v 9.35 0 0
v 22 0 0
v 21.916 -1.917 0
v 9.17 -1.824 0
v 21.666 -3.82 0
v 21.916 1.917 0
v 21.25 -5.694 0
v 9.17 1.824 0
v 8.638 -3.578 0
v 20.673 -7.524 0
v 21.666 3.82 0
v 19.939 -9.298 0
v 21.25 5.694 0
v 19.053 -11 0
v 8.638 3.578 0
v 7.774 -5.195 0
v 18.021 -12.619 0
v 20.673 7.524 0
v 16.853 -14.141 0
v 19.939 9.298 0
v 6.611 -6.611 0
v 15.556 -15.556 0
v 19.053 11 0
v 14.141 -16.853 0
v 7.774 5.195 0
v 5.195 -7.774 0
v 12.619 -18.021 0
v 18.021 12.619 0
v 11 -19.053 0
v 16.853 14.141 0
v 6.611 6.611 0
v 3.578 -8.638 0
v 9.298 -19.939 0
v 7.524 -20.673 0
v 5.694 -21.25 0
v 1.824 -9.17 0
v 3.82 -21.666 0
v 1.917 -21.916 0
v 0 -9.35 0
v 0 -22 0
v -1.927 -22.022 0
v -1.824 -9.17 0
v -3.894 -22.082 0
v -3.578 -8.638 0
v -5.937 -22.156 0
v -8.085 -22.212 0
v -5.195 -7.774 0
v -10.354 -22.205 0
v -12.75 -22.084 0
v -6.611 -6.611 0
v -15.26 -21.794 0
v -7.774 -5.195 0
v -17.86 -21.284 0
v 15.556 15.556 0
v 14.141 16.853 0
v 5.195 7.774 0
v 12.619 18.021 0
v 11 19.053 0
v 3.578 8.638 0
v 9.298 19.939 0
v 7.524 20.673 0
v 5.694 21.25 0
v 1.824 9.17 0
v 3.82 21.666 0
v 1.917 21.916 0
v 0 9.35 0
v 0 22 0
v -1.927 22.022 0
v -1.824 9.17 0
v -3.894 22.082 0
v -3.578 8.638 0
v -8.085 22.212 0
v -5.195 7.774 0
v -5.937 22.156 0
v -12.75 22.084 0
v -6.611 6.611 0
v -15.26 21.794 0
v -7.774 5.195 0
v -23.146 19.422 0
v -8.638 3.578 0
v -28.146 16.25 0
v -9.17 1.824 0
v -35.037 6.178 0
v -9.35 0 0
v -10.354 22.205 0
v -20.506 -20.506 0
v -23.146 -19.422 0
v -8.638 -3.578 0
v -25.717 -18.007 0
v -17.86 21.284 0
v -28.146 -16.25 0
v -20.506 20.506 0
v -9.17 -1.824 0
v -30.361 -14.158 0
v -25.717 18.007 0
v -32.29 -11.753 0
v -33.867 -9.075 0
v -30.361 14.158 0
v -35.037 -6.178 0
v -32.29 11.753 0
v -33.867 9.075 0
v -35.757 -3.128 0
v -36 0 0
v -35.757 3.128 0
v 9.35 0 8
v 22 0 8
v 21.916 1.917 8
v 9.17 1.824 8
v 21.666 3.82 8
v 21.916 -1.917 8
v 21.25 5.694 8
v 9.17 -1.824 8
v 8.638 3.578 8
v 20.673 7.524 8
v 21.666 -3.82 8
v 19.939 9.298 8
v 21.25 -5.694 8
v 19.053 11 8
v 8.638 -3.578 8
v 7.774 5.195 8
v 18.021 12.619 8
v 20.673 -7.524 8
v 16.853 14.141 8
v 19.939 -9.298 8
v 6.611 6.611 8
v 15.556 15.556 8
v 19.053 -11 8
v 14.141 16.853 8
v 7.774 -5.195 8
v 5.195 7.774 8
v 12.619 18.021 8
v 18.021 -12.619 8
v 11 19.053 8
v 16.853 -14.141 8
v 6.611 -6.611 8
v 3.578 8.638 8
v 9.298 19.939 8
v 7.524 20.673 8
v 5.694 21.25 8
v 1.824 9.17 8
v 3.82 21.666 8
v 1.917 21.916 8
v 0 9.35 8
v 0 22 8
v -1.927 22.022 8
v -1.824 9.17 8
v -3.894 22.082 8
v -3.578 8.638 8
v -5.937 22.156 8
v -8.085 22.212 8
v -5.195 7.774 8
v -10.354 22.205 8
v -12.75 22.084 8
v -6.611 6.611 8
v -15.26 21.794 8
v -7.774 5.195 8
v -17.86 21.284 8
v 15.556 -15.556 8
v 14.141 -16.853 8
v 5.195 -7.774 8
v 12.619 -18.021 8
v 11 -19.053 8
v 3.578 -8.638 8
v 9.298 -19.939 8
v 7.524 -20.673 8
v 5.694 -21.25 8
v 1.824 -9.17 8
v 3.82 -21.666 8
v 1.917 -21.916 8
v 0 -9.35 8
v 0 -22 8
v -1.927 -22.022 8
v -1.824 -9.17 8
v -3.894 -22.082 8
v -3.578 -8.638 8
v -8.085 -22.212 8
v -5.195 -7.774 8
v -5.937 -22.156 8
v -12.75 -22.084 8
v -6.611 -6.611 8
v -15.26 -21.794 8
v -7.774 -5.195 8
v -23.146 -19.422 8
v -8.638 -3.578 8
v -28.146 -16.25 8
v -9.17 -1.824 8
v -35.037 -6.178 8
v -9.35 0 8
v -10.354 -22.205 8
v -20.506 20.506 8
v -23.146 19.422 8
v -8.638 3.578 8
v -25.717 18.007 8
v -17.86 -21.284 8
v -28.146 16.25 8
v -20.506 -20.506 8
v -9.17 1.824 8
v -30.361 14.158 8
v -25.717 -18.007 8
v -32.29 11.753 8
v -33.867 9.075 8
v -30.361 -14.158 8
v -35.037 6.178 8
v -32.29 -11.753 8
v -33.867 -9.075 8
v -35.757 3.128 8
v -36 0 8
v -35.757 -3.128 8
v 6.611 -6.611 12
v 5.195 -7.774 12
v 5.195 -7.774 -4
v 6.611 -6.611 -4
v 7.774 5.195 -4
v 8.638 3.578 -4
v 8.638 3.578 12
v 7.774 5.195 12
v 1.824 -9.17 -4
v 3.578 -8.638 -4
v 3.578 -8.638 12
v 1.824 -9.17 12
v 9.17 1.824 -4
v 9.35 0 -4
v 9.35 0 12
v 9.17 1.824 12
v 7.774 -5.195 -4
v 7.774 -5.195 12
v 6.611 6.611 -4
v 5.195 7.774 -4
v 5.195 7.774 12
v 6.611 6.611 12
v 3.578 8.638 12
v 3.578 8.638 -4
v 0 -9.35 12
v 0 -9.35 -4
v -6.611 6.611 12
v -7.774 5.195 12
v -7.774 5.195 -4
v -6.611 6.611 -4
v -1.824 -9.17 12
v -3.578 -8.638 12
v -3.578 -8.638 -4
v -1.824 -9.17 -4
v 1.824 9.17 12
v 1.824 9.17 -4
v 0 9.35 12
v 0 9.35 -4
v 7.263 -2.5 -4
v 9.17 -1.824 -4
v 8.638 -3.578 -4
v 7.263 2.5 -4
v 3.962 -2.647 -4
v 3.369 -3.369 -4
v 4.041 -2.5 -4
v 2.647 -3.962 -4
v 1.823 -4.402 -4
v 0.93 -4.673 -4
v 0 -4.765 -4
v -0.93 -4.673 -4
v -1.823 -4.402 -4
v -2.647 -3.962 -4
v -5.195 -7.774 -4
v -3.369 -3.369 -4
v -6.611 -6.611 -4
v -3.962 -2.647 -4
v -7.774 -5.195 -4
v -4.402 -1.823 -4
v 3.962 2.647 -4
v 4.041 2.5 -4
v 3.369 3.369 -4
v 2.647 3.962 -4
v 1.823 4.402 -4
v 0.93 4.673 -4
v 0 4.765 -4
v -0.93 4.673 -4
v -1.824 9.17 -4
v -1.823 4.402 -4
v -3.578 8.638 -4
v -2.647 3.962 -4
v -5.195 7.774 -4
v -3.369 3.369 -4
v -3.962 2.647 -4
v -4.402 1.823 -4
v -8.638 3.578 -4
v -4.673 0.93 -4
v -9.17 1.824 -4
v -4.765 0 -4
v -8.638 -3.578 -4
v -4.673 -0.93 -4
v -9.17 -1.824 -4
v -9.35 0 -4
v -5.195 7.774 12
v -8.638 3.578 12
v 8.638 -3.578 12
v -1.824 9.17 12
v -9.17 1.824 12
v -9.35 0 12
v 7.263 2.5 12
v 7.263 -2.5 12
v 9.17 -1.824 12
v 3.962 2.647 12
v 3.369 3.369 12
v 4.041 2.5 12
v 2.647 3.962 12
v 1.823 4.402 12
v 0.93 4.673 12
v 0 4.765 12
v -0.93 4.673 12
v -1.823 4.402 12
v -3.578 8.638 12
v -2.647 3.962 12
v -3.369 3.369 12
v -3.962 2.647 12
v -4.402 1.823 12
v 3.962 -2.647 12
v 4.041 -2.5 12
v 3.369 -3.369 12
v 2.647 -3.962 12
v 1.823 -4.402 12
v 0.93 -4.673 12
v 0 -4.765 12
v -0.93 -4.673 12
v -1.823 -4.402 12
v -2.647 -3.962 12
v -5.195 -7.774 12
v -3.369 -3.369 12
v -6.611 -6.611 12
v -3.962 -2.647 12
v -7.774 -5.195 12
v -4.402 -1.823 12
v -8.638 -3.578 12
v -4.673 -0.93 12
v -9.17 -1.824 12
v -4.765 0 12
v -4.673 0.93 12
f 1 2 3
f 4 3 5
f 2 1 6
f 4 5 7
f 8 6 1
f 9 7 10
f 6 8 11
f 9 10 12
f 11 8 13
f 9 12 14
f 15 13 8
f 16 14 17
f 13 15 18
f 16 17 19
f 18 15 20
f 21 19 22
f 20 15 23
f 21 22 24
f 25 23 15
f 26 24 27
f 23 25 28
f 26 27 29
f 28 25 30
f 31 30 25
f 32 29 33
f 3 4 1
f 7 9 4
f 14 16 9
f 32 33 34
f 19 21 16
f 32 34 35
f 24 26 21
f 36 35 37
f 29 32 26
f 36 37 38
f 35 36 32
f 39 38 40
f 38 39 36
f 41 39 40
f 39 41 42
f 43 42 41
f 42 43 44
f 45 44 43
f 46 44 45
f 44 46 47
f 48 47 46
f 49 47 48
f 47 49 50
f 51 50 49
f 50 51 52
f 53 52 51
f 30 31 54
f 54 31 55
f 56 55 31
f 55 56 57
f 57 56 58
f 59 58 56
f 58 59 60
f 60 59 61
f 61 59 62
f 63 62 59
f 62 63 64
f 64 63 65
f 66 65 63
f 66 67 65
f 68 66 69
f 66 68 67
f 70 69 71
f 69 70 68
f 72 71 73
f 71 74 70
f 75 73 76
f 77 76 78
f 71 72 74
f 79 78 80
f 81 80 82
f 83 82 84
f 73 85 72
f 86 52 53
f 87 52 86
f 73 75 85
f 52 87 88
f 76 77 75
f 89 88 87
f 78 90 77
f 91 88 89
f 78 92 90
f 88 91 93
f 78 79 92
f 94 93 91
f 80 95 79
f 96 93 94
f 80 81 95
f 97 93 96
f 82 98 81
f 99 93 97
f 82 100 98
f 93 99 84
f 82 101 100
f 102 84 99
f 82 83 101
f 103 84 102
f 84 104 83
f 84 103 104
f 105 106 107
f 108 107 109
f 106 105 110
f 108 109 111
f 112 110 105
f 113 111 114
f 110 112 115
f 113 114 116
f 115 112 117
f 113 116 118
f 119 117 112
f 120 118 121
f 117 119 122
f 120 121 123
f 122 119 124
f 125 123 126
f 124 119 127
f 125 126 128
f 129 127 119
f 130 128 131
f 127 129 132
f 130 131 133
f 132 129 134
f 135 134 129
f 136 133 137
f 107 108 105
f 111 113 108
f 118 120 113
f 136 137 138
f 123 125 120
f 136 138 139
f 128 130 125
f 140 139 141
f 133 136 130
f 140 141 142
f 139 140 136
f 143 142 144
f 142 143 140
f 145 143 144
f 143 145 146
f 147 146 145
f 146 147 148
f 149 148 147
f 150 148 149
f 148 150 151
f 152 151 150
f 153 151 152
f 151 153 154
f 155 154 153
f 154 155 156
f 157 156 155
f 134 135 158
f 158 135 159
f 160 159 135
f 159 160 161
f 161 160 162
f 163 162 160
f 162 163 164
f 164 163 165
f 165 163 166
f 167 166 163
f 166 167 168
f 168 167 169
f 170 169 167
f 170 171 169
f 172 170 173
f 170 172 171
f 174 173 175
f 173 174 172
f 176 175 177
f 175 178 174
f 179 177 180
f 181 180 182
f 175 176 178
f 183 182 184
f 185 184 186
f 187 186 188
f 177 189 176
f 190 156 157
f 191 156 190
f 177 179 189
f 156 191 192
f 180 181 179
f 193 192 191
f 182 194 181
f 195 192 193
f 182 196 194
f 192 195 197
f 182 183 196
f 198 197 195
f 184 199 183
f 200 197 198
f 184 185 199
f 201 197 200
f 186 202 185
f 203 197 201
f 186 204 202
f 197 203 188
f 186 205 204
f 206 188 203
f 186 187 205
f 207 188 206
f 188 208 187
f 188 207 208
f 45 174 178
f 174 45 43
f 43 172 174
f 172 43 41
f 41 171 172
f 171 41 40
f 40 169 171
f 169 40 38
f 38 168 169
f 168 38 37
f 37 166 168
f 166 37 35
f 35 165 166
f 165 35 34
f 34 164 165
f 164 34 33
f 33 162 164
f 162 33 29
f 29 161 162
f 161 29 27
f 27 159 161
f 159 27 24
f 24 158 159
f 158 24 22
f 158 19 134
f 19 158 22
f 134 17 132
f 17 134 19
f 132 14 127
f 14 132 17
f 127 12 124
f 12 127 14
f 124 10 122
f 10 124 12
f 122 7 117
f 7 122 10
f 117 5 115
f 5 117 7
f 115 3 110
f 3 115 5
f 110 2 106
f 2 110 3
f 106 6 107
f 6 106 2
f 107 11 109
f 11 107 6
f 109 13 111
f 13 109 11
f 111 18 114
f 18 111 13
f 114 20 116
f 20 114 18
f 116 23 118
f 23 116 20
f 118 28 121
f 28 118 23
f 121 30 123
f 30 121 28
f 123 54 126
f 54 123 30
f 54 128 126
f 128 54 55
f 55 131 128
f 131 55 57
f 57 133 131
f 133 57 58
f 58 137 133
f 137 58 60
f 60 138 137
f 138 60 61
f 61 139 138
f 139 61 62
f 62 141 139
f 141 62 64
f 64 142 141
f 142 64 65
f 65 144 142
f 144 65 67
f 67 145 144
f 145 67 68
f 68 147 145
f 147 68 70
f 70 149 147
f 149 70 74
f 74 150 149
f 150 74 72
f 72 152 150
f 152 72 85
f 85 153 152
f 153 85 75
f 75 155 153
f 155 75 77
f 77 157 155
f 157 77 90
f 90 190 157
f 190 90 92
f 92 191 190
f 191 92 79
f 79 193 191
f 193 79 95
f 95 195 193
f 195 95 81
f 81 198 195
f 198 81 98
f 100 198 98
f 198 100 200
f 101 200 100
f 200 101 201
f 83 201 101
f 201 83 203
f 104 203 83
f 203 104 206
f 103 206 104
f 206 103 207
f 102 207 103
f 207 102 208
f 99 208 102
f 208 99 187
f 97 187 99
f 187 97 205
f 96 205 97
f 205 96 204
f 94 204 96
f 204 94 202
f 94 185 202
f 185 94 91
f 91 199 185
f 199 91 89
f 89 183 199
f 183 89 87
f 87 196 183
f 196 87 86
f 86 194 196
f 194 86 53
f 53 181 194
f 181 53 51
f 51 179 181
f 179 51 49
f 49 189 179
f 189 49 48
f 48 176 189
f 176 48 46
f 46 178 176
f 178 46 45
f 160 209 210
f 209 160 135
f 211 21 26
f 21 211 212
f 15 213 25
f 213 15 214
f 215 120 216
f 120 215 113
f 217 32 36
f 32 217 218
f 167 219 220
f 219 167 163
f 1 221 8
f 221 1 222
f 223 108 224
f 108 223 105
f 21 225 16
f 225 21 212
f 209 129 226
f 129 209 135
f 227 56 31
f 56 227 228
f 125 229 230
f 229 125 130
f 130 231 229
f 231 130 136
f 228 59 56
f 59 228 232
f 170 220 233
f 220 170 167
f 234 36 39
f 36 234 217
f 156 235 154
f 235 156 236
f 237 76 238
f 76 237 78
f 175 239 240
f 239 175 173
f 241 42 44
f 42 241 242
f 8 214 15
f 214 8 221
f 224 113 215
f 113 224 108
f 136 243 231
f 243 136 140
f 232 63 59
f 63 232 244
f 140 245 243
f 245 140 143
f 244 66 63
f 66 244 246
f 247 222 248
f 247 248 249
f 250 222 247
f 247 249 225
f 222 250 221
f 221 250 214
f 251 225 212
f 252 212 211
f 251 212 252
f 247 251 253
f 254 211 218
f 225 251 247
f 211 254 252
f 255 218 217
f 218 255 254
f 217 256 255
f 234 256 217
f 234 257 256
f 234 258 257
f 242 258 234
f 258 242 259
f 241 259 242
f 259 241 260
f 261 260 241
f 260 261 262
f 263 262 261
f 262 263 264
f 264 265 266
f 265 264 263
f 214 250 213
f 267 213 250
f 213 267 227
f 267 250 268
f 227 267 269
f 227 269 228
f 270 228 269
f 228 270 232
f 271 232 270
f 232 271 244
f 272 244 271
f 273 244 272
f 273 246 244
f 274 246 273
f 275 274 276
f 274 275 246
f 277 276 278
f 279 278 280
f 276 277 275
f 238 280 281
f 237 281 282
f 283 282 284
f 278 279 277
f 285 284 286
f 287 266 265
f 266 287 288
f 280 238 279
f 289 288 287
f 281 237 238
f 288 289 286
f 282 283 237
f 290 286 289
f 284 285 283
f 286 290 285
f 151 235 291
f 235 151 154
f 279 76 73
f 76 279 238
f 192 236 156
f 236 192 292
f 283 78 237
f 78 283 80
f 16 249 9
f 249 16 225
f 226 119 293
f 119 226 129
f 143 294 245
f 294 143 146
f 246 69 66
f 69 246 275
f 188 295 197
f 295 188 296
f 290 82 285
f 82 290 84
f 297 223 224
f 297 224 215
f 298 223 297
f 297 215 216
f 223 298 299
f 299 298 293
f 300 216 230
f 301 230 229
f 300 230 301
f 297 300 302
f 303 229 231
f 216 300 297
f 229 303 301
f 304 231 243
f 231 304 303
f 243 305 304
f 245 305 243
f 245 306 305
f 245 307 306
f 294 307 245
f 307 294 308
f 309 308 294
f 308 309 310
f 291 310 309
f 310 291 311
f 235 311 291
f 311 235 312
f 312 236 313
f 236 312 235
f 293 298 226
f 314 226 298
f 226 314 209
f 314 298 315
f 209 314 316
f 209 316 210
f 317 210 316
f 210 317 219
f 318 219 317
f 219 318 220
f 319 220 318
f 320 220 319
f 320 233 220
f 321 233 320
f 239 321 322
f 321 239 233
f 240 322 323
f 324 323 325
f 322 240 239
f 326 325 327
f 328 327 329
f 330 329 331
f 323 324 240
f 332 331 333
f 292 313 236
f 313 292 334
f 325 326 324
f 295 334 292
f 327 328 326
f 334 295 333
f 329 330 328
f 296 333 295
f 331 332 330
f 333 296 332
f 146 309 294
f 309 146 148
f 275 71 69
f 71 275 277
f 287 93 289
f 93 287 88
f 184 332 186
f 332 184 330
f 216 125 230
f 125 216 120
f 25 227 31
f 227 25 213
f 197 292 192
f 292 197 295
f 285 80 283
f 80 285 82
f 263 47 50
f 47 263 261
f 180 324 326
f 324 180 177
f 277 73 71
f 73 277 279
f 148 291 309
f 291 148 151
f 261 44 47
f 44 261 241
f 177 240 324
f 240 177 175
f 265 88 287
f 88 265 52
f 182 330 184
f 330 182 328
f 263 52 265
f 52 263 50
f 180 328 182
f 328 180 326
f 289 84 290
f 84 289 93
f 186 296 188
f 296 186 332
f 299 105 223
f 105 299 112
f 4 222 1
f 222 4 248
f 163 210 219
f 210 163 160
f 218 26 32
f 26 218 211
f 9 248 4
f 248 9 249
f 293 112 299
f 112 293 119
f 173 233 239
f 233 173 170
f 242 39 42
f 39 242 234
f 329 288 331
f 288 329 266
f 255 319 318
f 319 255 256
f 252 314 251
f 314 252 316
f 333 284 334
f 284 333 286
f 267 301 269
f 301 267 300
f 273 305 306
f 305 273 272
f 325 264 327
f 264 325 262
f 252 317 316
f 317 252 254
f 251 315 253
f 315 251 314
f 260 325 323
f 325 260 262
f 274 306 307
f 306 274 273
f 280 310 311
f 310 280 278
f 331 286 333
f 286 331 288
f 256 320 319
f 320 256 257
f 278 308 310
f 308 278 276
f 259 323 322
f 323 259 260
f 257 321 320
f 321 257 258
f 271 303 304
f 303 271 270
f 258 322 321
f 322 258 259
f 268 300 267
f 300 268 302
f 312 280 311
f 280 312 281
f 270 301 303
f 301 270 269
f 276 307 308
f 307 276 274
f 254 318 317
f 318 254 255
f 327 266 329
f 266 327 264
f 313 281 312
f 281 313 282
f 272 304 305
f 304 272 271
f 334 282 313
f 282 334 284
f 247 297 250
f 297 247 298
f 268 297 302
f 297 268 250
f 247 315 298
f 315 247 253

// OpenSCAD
$fn = 32;

// ----------------------------------------------------------------------
// Cam: base radius 22 mm with a 14 mm lift over 180 degrees
// ----------------------------------------------------------------------

// --- parameters (mm) ---
base_r = 22;              // base radius
lift = 14;                // lift height above the base radius
lift_span = 180;          // angular width of the lift
lift_start = 90;          // angle where the lift starts
cam_t = 8;                // cam plate thickness
hub_d = 18.7;             // hub diameter
hub_h = 16;               // hub height
bore_d = 9.53;            // bore
key_w = 5;                // keyway width
key_depth = 2.5;          // keyway depth

cam_profile = [[22, 0], [21.916, 1.917], [21.666, 3.82], [21.25, 5.694], [20.673, 7.524], [19.939, 9.298], [19.053, 11], [18.021, 12.619], [16.853, 14.141], [15.556, 15.556], [14.141, 16.853], [12.619, 18.021], [11, 19.053], [9.298, 19.939], [7.524, 20.673], [5.694, 21.25], [3.82, 21.666], [1.917, 21.916], [0, 22], [-1.927, 22.022], [-3.894, 22.082], [-5.937, 22.156], [-8.085, 22.212], [-10.354, 22.205], [-12.75, 22.084], [-15.26, 21.794], [-17.86, 21.284], [-20.506, 20.506], [-23.146, 19.422], [-25.717, 18.007], [-28.146, 16.25], [-30.361, 14.158], [-32.29, 11.753], [-33.867, 9.075], [-35.037, 6.178], [-35.757, 3.128], [-36, 0], [-35.757, -3.128], [-35.037, -6.178], [-33.867, -9.075], [-32.29, -11.753], [-30.361, -14.158], [-28.146, -16.25], [-25.717, -18.007], [-23.146, -19.422], [-20.506, -20.506], [-17.86, -21.284], [-15.26, -21.794], [-12.75, -22.084], [-10.354, -22.205], [-8.085, -22.212], [-5.937, -22.156], [-3.894, -22.082], [-1.927, -22.022], [0, -22], [1.917, -21.916], [3.82, -21.666], [5.694, -21.25], [7.524, -20.673], [9.298, -19.939], [11, -19.053], [12.619, -18.021], [14.141, -16.853], [15.556, -15.556], [16.853, -14.141], [18.021, -12.619], [19.053, -11], [19.939, -9.298], [20.673, -7.524], [21.25, -5.694], [21.666, -3.82], [21.916, -1.917]];

difference() {
  union() {
    linear_extrude(height = cam_t) polygon(cam_profile);
    /* hub, proud of the cam plate on both sides */
    translate([0, 0, -4]) cylinder(h = hub_h, d = hub_d);
  }
  /* bore through the hub, 2.5 mm clear on both faces */
  translate([0, 0, -6.5]) cylinder(h = hub_h + 5, d = bore_d);
  /* keyway, milled through the whole hub */
  translate([2.263, -2.5, -6.5]) cube([5, 5, 21]);
}
